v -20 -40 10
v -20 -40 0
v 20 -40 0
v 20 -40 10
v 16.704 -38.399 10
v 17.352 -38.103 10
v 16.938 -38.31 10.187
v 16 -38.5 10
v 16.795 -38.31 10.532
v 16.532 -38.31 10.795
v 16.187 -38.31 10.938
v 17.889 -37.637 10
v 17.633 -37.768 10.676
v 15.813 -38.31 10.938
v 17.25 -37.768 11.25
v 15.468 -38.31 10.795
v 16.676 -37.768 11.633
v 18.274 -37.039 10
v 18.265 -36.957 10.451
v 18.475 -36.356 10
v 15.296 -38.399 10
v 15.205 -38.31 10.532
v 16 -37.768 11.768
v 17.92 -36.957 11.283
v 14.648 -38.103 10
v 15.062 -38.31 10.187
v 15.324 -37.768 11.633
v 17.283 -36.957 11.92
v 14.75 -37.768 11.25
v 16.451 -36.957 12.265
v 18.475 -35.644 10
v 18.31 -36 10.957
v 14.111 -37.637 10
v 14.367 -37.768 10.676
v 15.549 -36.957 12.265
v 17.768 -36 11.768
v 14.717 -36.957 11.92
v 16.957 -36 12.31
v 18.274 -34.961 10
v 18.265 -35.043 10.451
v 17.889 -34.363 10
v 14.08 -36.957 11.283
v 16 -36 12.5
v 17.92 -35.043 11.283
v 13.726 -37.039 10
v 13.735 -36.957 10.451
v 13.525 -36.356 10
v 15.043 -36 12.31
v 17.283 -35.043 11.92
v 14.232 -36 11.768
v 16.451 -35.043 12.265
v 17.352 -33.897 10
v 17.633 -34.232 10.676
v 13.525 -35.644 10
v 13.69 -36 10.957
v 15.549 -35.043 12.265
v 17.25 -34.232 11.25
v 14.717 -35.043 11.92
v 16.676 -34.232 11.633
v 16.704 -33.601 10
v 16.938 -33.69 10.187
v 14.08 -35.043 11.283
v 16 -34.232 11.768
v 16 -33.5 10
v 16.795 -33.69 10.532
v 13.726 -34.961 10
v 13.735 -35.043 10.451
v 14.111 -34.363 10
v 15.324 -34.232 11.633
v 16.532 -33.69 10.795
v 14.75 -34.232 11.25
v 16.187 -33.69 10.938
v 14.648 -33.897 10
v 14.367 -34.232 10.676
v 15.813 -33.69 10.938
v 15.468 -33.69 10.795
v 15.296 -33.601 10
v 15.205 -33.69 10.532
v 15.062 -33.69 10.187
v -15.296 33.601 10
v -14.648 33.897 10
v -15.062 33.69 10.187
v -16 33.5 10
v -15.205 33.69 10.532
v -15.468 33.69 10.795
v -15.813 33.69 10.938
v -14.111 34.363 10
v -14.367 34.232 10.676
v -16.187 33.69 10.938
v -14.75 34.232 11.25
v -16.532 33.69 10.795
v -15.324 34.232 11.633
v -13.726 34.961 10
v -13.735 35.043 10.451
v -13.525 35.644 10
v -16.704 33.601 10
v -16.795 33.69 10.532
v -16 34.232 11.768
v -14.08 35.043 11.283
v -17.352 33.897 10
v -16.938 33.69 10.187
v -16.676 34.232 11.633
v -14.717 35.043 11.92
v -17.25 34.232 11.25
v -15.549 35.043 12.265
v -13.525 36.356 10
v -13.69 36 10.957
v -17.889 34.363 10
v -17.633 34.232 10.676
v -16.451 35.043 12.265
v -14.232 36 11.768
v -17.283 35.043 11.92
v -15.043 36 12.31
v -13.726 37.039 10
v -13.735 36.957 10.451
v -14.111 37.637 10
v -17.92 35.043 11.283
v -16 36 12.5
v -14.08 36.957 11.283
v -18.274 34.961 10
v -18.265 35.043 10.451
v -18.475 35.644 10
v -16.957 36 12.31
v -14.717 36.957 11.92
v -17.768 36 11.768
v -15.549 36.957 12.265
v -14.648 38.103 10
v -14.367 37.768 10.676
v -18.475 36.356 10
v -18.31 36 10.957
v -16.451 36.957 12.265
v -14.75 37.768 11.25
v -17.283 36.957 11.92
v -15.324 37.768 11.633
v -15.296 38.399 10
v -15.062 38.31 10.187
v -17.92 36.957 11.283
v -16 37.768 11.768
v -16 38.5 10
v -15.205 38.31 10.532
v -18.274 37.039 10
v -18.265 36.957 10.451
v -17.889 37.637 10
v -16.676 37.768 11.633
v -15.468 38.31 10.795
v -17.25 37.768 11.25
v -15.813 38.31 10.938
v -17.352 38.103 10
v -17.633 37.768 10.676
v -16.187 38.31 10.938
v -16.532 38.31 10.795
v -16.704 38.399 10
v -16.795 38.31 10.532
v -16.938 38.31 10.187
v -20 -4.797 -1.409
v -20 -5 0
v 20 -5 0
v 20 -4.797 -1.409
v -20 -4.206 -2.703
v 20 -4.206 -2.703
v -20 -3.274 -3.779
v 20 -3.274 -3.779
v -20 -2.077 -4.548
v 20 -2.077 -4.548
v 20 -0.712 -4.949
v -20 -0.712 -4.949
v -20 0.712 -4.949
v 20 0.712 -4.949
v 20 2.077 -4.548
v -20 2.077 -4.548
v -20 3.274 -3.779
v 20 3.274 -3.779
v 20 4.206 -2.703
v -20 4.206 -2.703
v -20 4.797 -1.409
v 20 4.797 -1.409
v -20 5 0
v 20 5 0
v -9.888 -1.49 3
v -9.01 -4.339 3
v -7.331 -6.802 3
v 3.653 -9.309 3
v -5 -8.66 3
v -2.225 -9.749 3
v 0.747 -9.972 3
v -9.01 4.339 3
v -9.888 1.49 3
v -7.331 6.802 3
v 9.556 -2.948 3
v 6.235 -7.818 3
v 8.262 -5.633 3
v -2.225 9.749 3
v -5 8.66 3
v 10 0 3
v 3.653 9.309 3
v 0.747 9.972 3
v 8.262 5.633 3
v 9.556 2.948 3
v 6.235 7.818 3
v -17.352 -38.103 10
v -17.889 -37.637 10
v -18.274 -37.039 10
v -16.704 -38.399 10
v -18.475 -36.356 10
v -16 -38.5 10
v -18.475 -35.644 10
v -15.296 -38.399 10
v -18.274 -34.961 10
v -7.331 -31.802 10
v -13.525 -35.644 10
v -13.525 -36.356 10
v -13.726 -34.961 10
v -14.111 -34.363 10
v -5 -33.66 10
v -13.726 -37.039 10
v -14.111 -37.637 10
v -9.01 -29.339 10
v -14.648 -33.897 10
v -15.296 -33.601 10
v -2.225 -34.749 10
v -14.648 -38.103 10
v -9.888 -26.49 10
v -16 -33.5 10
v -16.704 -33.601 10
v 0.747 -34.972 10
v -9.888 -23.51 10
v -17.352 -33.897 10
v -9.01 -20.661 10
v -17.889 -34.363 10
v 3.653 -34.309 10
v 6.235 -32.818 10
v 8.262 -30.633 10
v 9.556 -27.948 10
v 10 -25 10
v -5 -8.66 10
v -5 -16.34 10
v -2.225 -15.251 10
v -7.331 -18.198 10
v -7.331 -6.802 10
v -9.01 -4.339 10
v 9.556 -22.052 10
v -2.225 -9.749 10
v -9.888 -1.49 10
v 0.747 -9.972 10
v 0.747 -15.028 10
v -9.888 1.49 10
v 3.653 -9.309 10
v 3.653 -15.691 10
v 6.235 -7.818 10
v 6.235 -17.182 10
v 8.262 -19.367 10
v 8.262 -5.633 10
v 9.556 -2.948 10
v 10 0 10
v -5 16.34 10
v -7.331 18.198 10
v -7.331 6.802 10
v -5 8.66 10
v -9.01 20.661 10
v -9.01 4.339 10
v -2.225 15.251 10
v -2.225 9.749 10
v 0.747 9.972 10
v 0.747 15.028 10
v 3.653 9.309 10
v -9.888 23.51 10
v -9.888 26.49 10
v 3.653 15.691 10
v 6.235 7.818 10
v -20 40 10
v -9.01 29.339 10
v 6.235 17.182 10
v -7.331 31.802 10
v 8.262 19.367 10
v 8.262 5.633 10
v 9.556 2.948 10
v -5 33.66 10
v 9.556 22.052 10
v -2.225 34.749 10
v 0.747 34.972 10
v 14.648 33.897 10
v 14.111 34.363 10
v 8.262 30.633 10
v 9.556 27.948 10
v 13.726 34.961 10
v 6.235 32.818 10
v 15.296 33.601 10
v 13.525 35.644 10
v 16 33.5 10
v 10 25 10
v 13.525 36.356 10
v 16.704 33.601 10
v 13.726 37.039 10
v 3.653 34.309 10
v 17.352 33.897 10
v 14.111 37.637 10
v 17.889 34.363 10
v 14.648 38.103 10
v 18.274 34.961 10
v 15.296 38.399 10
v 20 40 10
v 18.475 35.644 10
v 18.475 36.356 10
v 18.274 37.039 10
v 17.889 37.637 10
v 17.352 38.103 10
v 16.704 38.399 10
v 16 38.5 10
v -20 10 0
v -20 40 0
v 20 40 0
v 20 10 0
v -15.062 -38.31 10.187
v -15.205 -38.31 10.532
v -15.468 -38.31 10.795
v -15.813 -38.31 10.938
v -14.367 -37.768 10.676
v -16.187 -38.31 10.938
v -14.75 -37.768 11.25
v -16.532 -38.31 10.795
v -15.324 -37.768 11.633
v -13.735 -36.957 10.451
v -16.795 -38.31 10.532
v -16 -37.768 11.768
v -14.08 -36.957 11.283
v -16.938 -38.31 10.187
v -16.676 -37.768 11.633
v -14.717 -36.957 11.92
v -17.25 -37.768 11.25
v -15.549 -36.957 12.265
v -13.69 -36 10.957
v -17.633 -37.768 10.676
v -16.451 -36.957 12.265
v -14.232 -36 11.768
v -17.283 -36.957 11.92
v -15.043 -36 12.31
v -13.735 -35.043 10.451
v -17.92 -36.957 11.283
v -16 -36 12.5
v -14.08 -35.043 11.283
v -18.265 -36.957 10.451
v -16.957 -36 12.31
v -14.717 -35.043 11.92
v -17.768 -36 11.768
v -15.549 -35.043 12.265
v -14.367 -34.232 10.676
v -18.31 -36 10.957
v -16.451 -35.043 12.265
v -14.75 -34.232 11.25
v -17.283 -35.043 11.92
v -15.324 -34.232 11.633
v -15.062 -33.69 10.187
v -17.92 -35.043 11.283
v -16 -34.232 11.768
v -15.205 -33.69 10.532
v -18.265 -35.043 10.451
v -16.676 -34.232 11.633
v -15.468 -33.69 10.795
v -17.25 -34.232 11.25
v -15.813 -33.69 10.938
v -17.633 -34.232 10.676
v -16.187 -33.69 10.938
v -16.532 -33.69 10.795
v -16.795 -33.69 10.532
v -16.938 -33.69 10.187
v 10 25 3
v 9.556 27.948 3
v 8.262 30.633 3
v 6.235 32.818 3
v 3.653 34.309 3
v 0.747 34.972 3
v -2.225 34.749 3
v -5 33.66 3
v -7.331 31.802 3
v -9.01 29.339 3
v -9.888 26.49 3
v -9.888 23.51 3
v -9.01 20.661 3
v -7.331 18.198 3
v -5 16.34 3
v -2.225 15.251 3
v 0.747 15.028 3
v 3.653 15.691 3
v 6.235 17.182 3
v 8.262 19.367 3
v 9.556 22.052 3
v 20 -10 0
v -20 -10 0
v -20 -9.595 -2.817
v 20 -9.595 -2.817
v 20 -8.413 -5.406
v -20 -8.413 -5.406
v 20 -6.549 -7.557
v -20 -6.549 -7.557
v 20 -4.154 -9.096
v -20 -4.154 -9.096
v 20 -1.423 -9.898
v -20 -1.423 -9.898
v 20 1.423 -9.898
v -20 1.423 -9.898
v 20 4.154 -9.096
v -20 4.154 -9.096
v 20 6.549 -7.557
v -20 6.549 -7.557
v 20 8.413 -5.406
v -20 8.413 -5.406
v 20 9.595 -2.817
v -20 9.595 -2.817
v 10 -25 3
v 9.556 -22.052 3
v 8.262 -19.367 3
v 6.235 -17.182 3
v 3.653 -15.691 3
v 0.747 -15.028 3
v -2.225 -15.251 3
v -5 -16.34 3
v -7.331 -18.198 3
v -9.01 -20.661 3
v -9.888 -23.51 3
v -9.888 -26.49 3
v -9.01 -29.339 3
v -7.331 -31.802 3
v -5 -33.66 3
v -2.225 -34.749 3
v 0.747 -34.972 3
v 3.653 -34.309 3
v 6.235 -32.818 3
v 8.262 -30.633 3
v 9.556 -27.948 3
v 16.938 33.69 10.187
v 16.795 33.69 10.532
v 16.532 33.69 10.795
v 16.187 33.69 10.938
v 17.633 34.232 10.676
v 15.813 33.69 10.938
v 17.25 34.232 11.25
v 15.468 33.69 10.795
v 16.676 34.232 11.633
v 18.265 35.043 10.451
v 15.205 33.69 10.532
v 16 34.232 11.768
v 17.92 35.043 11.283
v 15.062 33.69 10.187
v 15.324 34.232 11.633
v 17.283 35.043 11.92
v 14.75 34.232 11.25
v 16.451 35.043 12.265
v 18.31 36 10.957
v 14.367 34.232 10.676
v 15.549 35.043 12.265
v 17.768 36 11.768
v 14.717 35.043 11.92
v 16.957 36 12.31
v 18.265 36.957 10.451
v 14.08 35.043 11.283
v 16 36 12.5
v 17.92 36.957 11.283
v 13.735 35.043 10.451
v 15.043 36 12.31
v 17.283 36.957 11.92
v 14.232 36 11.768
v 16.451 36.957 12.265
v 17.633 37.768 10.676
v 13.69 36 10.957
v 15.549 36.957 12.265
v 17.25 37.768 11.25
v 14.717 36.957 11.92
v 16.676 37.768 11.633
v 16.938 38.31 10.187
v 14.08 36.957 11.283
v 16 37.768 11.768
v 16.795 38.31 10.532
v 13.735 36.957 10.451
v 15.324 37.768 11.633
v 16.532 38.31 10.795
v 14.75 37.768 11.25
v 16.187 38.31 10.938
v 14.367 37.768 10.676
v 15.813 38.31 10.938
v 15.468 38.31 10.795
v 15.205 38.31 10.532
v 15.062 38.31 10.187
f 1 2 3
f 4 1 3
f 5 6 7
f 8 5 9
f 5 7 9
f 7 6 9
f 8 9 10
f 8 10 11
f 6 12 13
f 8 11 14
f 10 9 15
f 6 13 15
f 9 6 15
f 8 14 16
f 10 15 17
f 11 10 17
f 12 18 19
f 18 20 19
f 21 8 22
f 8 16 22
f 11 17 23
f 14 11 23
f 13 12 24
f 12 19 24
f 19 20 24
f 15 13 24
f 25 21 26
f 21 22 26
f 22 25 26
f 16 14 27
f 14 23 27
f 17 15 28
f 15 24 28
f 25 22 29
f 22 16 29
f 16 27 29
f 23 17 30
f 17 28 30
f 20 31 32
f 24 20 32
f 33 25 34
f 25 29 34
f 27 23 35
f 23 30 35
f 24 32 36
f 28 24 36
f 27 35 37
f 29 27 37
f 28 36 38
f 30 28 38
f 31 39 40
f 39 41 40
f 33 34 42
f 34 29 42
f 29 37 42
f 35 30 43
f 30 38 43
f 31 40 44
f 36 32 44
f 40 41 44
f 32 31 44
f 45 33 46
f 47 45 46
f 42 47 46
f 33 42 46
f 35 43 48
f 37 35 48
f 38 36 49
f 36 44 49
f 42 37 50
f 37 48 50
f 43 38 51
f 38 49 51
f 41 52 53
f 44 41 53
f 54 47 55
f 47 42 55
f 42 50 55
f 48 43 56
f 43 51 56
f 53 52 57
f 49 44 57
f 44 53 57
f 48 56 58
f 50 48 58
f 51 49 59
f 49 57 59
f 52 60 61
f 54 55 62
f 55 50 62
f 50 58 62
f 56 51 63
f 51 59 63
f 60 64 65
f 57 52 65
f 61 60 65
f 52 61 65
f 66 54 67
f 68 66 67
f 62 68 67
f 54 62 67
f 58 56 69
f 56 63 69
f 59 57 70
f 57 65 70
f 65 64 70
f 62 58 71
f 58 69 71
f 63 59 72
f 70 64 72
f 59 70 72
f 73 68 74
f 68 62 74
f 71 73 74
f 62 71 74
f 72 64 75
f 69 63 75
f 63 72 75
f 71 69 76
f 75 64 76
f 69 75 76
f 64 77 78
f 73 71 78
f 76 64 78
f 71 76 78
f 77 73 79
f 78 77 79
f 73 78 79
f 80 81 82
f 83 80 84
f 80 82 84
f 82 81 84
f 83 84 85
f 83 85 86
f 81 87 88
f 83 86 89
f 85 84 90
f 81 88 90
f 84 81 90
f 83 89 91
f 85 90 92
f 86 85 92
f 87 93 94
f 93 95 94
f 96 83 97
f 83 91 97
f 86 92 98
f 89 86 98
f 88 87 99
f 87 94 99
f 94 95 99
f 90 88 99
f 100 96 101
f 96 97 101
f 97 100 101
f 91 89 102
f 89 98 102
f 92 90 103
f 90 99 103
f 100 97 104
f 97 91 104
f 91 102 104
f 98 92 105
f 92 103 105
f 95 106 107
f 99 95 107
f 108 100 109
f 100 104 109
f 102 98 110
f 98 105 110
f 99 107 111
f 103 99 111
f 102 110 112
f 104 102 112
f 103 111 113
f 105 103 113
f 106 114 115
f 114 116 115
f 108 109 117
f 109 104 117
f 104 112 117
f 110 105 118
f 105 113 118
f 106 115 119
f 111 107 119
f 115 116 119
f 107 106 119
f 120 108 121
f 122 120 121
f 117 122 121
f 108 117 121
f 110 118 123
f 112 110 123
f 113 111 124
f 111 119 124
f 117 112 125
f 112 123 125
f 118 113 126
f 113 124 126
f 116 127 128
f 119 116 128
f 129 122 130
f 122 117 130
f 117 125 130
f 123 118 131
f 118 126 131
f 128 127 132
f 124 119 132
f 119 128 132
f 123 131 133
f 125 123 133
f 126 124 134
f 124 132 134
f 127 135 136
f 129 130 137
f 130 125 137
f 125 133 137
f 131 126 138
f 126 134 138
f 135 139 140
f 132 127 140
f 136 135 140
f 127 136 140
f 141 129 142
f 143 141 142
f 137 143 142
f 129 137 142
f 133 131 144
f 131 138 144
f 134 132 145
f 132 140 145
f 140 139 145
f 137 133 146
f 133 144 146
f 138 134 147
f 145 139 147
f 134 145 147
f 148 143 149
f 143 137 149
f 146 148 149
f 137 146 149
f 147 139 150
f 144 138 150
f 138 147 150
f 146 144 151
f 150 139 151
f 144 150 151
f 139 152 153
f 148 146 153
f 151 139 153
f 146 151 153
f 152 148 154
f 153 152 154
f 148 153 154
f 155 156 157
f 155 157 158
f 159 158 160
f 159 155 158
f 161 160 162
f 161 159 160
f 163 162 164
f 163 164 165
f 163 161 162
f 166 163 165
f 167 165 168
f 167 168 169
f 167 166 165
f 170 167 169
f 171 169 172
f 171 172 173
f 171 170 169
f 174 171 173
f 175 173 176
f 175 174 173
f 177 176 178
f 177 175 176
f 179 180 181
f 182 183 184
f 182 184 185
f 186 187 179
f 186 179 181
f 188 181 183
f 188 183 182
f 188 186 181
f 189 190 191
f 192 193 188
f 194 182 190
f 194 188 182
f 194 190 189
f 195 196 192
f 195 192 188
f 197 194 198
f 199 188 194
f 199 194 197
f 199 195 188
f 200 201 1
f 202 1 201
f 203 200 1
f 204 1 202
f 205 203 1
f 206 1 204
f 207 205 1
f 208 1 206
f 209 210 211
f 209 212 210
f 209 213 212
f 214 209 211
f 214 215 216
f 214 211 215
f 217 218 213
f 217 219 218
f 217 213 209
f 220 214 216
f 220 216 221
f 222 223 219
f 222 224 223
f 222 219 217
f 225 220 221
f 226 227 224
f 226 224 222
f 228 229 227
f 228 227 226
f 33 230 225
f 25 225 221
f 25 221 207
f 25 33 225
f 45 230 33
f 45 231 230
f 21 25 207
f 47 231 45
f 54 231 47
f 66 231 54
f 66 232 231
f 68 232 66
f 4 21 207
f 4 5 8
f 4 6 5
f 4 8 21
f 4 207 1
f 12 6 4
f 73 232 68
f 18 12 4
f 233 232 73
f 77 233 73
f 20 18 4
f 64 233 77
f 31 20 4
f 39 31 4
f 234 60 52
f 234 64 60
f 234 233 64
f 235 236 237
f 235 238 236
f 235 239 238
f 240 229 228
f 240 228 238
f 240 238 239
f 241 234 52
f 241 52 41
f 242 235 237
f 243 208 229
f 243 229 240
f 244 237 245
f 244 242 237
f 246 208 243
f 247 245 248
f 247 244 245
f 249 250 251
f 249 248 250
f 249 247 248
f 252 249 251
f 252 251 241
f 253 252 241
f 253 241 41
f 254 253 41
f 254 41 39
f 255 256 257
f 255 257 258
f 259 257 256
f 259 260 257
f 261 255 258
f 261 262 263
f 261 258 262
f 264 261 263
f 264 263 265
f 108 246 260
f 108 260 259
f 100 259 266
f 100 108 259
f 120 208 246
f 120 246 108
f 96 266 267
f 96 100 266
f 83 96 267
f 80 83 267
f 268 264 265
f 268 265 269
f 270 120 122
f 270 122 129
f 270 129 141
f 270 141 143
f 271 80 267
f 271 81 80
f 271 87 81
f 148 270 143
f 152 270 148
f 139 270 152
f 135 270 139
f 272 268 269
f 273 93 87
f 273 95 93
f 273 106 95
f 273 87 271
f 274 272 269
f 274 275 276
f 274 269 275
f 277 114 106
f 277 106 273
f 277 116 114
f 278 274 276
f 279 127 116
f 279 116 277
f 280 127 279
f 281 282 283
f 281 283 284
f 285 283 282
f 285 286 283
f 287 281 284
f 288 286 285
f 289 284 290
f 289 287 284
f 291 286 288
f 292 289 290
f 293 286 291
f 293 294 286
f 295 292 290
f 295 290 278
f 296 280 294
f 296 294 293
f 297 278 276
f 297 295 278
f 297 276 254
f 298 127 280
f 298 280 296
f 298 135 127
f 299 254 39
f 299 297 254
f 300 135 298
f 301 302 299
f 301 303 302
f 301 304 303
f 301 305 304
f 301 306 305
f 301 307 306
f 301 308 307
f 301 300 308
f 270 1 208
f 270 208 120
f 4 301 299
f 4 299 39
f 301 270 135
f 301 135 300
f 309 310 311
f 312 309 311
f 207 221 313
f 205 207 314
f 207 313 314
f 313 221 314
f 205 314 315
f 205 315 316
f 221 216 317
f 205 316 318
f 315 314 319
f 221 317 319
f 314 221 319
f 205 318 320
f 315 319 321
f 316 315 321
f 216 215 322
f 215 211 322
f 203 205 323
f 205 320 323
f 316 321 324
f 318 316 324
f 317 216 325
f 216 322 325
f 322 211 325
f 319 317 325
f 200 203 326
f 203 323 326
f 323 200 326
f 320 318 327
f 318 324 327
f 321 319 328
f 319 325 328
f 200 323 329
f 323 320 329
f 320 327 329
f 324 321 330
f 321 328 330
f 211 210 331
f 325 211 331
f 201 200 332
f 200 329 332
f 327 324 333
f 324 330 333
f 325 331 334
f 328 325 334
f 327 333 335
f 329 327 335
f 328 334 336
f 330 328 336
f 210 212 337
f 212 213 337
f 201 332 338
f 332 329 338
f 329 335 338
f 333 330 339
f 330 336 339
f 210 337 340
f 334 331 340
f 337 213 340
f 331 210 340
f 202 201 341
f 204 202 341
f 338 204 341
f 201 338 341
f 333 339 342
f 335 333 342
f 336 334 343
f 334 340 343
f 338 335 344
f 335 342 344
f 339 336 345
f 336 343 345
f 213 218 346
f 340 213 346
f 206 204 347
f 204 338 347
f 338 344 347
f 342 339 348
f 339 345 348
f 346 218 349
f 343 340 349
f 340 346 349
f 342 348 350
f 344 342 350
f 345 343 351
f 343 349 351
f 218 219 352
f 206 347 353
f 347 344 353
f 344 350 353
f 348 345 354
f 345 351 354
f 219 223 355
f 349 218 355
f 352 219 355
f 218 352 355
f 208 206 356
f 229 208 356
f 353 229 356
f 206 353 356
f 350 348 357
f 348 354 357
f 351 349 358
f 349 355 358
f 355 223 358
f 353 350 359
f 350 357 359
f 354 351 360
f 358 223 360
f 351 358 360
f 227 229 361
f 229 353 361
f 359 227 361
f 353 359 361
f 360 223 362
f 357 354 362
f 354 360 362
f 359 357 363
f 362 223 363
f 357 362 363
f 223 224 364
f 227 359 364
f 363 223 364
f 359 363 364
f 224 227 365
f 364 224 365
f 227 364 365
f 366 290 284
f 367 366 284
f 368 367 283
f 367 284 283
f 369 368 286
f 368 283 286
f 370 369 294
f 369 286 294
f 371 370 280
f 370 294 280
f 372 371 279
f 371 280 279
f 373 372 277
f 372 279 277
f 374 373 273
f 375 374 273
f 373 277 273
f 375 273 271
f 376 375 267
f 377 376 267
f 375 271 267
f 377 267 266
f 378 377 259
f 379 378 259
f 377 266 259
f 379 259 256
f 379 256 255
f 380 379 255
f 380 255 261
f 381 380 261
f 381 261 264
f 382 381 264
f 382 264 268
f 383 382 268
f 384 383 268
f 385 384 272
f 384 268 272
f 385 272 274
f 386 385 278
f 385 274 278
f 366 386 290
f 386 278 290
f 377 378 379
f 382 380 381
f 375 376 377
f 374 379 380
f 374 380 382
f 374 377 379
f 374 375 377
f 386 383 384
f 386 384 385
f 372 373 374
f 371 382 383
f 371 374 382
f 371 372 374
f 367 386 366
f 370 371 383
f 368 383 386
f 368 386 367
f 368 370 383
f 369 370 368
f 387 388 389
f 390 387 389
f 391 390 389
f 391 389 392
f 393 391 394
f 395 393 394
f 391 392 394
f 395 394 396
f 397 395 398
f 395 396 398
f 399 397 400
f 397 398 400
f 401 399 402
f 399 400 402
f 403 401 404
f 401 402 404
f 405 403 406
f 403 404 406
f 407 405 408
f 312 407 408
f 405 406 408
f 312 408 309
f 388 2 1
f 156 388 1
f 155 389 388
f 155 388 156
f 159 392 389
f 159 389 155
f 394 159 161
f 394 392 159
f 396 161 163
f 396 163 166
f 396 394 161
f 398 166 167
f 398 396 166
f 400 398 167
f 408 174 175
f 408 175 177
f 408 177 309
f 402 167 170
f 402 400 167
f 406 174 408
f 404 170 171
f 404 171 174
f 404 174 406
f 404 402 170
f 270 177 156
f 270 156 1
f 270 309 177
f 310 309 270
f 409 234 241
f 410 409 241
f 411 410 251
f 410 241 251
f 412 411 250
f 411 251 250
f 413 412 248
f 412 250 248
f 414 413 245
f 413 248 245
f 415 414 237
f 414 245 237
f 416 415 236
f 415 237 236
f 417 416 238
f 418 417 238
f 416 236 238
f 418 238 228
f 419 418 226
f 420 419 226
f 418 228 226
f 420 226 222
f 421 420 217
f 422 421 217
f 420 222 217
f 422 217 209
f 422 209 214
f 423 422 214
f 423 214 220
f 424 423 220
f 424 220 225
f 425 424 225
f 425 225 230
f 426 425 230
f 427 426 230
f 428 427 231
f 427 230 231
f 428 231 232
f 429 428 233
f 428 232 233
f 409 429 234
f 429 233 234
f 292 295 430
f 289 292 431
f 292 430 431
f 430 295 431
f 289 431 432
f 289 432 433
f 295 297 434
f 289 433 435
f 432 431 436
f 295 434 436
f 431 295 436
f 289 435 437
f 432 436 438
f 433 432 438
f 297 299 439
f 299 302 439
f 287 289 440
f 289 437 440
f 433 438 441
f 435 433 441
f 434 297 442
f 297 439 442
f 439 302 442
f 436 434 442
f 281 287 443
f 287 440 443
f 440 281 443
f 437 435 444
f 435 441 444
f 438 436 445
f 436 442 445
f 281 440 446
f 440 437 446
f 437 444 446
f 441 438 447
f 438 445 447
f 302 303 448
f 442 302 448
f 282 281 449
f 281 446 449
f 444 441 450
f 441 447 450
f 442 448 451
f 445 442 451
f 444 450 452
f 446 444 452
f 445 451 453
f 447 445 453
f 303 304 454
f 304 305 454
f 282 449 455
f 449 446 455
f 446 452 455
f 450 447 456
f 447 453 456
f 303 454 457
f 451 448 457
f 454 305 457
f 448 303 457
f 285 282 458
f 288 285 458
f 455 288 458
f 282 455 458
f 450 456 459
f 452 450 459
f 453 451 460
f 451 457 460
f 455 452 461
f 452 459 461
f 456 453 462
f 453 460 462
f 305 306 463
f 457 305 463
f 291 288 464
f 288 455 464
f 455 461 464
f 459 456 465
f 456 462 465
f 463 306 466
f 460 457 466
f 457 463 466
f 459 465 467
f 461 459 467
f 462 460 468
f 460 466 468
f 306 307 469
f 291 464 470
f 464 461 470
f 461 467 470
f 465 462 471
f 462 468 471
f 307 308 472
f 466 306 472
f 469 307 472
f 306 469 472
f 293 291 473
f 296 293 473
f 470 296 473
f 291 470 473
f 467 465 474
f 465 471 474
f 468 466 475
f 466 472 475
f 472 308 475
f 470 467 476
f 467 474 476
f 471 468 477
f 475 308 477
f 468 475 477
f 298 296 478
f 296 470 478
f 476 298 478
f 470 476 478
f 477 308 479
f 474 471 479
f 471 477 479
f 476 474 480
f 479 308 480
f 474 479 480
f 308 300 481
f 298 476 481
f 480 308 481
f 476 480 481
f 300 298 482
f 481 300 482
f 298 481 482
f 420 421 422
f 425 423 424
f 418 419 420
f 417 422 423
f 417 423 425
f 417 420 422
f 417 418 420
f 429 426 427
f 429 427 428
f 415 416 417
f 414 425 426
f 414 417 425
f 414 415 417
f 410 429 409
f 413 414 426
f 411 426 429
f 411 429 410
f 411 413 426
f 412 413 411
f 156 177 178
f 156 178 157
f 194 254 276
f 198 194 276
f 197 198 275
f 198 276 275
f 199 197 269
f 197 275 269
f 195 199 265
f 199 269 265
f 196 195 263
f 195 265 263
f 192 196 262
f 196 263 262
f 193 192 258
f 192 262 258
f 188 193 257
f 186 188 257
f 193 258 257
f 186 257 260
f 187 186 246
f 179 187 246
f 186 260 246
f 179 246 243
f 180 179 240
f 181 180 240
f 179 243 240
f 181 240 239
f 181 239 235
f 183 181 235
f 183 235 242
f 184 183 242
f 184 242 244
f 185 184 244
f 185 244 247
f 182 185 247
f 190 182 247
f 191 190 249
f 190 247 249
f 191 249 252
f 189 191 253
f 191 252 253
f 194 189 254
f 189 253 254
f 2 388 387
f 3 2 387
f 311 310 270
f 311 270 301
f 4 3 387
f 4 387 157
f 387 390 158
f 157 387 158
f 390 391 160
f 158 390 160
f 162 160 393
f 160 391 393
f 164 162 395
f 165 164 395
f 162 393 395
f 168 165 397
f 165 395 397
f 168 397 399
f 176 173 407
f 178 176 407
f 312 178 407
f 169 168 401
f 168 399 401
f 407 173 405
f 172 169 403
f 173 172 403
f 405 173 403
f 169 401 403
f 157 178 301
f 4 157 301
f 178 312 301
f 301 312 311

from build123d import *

# Parameters (mm, degrees)
SKETCH3_W           = 40
SKETCH3_H           = 80
BOSS_EXTRUDE1_DEPTH = 10
SKETCH4_R           = 10
CUT_EXTRUDE4_DEPTH  = 7
BOSS_EXTRUDE3_DEPTH = 40
CUT_EXTRUDE5_DEPTH  = 40


with BuildPart() as part:
    # Sketch3 → Boss-Extrude1 (new body)
    with BuildSketch(Plane.XY):
        Rectangle(SKETCH3_W, SKETCH3_H)
    extrude(amount=BOSS_EXTRUDE1_DEPTH)

    # Sketch4 → Cut-Extrude4 (cut)
    with BuildSketch(Plane.XY.offset(10)):
        with Locations((0, 25)):
            Circle(SKETCH4_R)
        Circle(SKETCH4_R)
        with Locations((0, -25)):
            Circle(SKETCH4_R)
    extrude(amount=-CUT_EXTRUDE4_DEPTH, mode=Mode.SUBTRACT)

    # Sketch5 → Revolve1 (revolve)
    with BuildSketch(Plane.XY.offset(10)):
        with BuildLine():
            Line((16, 38.5), (16, 33.5))
            ThreePointArc((16, 33.5), (13.5, 36), (16, 38.5))
        make_face()
    revolve(axis=Axis((16, 38.5, 10), (0, -1, 0)))

    # Sketch7 → Revolve2 (revolve)
    with BuildSketch(Plane.XY.offset(10)):
        with BuildLine():
            Line((-16, -33.5), (-16, -38.5))
            ThreePointArc((-16, -38.5), (-18.5, -36), (-16, -33.5))
        make_face()
        with BuildLine():
            Line((-16, 38.5), (-16, 33.5))
            ThreePointArc((-16, 33.5), (-18.5, 36), (-16, 38.5))
        make_face()
    revolve(axis=Axis((-16, -33.5, 10), (0, -1, 0)))

    # Sketch8 → Revolve3 (revolve)
    with BuildSketch(Plane.XY.offset(10)):
        with BuildLine():
            Line((16, -33.5), (16, -38.5))
            ThreePointArc((16, -38.5), (13.5, -36), (16, -33.5))
        make_face()
    revolve(axis=Axis((16, -33.5, 10), (0, -1, 0)))

    # Sketch12 → Boss-Extrude3 (add)
    with BuildSketch(Plane.ZY.offset(20)):
        with BuildLine():
            Line((0, 10), (0, -10))
            ThreePointArc((0, -10), (-10, 0), (0, 10))
        make_face()
    extrude(amount=-BOSS_EXTRUDE3_DEPTH)

    # Sketch13 → Cut-Extrude5 (cut)
    with BuildSketch(Plane.ZY.offset(20)):
        with BuildLine():
            Line((0, 5), (0, -5))
            ThreePointArc((0, -5), (-5, 0), (0, 5))
        make_face()
    extrude(amount=-CUT_EXTRUDE5_DEPTH, mode=Mode.SUBTRACT)


solid = part.part
